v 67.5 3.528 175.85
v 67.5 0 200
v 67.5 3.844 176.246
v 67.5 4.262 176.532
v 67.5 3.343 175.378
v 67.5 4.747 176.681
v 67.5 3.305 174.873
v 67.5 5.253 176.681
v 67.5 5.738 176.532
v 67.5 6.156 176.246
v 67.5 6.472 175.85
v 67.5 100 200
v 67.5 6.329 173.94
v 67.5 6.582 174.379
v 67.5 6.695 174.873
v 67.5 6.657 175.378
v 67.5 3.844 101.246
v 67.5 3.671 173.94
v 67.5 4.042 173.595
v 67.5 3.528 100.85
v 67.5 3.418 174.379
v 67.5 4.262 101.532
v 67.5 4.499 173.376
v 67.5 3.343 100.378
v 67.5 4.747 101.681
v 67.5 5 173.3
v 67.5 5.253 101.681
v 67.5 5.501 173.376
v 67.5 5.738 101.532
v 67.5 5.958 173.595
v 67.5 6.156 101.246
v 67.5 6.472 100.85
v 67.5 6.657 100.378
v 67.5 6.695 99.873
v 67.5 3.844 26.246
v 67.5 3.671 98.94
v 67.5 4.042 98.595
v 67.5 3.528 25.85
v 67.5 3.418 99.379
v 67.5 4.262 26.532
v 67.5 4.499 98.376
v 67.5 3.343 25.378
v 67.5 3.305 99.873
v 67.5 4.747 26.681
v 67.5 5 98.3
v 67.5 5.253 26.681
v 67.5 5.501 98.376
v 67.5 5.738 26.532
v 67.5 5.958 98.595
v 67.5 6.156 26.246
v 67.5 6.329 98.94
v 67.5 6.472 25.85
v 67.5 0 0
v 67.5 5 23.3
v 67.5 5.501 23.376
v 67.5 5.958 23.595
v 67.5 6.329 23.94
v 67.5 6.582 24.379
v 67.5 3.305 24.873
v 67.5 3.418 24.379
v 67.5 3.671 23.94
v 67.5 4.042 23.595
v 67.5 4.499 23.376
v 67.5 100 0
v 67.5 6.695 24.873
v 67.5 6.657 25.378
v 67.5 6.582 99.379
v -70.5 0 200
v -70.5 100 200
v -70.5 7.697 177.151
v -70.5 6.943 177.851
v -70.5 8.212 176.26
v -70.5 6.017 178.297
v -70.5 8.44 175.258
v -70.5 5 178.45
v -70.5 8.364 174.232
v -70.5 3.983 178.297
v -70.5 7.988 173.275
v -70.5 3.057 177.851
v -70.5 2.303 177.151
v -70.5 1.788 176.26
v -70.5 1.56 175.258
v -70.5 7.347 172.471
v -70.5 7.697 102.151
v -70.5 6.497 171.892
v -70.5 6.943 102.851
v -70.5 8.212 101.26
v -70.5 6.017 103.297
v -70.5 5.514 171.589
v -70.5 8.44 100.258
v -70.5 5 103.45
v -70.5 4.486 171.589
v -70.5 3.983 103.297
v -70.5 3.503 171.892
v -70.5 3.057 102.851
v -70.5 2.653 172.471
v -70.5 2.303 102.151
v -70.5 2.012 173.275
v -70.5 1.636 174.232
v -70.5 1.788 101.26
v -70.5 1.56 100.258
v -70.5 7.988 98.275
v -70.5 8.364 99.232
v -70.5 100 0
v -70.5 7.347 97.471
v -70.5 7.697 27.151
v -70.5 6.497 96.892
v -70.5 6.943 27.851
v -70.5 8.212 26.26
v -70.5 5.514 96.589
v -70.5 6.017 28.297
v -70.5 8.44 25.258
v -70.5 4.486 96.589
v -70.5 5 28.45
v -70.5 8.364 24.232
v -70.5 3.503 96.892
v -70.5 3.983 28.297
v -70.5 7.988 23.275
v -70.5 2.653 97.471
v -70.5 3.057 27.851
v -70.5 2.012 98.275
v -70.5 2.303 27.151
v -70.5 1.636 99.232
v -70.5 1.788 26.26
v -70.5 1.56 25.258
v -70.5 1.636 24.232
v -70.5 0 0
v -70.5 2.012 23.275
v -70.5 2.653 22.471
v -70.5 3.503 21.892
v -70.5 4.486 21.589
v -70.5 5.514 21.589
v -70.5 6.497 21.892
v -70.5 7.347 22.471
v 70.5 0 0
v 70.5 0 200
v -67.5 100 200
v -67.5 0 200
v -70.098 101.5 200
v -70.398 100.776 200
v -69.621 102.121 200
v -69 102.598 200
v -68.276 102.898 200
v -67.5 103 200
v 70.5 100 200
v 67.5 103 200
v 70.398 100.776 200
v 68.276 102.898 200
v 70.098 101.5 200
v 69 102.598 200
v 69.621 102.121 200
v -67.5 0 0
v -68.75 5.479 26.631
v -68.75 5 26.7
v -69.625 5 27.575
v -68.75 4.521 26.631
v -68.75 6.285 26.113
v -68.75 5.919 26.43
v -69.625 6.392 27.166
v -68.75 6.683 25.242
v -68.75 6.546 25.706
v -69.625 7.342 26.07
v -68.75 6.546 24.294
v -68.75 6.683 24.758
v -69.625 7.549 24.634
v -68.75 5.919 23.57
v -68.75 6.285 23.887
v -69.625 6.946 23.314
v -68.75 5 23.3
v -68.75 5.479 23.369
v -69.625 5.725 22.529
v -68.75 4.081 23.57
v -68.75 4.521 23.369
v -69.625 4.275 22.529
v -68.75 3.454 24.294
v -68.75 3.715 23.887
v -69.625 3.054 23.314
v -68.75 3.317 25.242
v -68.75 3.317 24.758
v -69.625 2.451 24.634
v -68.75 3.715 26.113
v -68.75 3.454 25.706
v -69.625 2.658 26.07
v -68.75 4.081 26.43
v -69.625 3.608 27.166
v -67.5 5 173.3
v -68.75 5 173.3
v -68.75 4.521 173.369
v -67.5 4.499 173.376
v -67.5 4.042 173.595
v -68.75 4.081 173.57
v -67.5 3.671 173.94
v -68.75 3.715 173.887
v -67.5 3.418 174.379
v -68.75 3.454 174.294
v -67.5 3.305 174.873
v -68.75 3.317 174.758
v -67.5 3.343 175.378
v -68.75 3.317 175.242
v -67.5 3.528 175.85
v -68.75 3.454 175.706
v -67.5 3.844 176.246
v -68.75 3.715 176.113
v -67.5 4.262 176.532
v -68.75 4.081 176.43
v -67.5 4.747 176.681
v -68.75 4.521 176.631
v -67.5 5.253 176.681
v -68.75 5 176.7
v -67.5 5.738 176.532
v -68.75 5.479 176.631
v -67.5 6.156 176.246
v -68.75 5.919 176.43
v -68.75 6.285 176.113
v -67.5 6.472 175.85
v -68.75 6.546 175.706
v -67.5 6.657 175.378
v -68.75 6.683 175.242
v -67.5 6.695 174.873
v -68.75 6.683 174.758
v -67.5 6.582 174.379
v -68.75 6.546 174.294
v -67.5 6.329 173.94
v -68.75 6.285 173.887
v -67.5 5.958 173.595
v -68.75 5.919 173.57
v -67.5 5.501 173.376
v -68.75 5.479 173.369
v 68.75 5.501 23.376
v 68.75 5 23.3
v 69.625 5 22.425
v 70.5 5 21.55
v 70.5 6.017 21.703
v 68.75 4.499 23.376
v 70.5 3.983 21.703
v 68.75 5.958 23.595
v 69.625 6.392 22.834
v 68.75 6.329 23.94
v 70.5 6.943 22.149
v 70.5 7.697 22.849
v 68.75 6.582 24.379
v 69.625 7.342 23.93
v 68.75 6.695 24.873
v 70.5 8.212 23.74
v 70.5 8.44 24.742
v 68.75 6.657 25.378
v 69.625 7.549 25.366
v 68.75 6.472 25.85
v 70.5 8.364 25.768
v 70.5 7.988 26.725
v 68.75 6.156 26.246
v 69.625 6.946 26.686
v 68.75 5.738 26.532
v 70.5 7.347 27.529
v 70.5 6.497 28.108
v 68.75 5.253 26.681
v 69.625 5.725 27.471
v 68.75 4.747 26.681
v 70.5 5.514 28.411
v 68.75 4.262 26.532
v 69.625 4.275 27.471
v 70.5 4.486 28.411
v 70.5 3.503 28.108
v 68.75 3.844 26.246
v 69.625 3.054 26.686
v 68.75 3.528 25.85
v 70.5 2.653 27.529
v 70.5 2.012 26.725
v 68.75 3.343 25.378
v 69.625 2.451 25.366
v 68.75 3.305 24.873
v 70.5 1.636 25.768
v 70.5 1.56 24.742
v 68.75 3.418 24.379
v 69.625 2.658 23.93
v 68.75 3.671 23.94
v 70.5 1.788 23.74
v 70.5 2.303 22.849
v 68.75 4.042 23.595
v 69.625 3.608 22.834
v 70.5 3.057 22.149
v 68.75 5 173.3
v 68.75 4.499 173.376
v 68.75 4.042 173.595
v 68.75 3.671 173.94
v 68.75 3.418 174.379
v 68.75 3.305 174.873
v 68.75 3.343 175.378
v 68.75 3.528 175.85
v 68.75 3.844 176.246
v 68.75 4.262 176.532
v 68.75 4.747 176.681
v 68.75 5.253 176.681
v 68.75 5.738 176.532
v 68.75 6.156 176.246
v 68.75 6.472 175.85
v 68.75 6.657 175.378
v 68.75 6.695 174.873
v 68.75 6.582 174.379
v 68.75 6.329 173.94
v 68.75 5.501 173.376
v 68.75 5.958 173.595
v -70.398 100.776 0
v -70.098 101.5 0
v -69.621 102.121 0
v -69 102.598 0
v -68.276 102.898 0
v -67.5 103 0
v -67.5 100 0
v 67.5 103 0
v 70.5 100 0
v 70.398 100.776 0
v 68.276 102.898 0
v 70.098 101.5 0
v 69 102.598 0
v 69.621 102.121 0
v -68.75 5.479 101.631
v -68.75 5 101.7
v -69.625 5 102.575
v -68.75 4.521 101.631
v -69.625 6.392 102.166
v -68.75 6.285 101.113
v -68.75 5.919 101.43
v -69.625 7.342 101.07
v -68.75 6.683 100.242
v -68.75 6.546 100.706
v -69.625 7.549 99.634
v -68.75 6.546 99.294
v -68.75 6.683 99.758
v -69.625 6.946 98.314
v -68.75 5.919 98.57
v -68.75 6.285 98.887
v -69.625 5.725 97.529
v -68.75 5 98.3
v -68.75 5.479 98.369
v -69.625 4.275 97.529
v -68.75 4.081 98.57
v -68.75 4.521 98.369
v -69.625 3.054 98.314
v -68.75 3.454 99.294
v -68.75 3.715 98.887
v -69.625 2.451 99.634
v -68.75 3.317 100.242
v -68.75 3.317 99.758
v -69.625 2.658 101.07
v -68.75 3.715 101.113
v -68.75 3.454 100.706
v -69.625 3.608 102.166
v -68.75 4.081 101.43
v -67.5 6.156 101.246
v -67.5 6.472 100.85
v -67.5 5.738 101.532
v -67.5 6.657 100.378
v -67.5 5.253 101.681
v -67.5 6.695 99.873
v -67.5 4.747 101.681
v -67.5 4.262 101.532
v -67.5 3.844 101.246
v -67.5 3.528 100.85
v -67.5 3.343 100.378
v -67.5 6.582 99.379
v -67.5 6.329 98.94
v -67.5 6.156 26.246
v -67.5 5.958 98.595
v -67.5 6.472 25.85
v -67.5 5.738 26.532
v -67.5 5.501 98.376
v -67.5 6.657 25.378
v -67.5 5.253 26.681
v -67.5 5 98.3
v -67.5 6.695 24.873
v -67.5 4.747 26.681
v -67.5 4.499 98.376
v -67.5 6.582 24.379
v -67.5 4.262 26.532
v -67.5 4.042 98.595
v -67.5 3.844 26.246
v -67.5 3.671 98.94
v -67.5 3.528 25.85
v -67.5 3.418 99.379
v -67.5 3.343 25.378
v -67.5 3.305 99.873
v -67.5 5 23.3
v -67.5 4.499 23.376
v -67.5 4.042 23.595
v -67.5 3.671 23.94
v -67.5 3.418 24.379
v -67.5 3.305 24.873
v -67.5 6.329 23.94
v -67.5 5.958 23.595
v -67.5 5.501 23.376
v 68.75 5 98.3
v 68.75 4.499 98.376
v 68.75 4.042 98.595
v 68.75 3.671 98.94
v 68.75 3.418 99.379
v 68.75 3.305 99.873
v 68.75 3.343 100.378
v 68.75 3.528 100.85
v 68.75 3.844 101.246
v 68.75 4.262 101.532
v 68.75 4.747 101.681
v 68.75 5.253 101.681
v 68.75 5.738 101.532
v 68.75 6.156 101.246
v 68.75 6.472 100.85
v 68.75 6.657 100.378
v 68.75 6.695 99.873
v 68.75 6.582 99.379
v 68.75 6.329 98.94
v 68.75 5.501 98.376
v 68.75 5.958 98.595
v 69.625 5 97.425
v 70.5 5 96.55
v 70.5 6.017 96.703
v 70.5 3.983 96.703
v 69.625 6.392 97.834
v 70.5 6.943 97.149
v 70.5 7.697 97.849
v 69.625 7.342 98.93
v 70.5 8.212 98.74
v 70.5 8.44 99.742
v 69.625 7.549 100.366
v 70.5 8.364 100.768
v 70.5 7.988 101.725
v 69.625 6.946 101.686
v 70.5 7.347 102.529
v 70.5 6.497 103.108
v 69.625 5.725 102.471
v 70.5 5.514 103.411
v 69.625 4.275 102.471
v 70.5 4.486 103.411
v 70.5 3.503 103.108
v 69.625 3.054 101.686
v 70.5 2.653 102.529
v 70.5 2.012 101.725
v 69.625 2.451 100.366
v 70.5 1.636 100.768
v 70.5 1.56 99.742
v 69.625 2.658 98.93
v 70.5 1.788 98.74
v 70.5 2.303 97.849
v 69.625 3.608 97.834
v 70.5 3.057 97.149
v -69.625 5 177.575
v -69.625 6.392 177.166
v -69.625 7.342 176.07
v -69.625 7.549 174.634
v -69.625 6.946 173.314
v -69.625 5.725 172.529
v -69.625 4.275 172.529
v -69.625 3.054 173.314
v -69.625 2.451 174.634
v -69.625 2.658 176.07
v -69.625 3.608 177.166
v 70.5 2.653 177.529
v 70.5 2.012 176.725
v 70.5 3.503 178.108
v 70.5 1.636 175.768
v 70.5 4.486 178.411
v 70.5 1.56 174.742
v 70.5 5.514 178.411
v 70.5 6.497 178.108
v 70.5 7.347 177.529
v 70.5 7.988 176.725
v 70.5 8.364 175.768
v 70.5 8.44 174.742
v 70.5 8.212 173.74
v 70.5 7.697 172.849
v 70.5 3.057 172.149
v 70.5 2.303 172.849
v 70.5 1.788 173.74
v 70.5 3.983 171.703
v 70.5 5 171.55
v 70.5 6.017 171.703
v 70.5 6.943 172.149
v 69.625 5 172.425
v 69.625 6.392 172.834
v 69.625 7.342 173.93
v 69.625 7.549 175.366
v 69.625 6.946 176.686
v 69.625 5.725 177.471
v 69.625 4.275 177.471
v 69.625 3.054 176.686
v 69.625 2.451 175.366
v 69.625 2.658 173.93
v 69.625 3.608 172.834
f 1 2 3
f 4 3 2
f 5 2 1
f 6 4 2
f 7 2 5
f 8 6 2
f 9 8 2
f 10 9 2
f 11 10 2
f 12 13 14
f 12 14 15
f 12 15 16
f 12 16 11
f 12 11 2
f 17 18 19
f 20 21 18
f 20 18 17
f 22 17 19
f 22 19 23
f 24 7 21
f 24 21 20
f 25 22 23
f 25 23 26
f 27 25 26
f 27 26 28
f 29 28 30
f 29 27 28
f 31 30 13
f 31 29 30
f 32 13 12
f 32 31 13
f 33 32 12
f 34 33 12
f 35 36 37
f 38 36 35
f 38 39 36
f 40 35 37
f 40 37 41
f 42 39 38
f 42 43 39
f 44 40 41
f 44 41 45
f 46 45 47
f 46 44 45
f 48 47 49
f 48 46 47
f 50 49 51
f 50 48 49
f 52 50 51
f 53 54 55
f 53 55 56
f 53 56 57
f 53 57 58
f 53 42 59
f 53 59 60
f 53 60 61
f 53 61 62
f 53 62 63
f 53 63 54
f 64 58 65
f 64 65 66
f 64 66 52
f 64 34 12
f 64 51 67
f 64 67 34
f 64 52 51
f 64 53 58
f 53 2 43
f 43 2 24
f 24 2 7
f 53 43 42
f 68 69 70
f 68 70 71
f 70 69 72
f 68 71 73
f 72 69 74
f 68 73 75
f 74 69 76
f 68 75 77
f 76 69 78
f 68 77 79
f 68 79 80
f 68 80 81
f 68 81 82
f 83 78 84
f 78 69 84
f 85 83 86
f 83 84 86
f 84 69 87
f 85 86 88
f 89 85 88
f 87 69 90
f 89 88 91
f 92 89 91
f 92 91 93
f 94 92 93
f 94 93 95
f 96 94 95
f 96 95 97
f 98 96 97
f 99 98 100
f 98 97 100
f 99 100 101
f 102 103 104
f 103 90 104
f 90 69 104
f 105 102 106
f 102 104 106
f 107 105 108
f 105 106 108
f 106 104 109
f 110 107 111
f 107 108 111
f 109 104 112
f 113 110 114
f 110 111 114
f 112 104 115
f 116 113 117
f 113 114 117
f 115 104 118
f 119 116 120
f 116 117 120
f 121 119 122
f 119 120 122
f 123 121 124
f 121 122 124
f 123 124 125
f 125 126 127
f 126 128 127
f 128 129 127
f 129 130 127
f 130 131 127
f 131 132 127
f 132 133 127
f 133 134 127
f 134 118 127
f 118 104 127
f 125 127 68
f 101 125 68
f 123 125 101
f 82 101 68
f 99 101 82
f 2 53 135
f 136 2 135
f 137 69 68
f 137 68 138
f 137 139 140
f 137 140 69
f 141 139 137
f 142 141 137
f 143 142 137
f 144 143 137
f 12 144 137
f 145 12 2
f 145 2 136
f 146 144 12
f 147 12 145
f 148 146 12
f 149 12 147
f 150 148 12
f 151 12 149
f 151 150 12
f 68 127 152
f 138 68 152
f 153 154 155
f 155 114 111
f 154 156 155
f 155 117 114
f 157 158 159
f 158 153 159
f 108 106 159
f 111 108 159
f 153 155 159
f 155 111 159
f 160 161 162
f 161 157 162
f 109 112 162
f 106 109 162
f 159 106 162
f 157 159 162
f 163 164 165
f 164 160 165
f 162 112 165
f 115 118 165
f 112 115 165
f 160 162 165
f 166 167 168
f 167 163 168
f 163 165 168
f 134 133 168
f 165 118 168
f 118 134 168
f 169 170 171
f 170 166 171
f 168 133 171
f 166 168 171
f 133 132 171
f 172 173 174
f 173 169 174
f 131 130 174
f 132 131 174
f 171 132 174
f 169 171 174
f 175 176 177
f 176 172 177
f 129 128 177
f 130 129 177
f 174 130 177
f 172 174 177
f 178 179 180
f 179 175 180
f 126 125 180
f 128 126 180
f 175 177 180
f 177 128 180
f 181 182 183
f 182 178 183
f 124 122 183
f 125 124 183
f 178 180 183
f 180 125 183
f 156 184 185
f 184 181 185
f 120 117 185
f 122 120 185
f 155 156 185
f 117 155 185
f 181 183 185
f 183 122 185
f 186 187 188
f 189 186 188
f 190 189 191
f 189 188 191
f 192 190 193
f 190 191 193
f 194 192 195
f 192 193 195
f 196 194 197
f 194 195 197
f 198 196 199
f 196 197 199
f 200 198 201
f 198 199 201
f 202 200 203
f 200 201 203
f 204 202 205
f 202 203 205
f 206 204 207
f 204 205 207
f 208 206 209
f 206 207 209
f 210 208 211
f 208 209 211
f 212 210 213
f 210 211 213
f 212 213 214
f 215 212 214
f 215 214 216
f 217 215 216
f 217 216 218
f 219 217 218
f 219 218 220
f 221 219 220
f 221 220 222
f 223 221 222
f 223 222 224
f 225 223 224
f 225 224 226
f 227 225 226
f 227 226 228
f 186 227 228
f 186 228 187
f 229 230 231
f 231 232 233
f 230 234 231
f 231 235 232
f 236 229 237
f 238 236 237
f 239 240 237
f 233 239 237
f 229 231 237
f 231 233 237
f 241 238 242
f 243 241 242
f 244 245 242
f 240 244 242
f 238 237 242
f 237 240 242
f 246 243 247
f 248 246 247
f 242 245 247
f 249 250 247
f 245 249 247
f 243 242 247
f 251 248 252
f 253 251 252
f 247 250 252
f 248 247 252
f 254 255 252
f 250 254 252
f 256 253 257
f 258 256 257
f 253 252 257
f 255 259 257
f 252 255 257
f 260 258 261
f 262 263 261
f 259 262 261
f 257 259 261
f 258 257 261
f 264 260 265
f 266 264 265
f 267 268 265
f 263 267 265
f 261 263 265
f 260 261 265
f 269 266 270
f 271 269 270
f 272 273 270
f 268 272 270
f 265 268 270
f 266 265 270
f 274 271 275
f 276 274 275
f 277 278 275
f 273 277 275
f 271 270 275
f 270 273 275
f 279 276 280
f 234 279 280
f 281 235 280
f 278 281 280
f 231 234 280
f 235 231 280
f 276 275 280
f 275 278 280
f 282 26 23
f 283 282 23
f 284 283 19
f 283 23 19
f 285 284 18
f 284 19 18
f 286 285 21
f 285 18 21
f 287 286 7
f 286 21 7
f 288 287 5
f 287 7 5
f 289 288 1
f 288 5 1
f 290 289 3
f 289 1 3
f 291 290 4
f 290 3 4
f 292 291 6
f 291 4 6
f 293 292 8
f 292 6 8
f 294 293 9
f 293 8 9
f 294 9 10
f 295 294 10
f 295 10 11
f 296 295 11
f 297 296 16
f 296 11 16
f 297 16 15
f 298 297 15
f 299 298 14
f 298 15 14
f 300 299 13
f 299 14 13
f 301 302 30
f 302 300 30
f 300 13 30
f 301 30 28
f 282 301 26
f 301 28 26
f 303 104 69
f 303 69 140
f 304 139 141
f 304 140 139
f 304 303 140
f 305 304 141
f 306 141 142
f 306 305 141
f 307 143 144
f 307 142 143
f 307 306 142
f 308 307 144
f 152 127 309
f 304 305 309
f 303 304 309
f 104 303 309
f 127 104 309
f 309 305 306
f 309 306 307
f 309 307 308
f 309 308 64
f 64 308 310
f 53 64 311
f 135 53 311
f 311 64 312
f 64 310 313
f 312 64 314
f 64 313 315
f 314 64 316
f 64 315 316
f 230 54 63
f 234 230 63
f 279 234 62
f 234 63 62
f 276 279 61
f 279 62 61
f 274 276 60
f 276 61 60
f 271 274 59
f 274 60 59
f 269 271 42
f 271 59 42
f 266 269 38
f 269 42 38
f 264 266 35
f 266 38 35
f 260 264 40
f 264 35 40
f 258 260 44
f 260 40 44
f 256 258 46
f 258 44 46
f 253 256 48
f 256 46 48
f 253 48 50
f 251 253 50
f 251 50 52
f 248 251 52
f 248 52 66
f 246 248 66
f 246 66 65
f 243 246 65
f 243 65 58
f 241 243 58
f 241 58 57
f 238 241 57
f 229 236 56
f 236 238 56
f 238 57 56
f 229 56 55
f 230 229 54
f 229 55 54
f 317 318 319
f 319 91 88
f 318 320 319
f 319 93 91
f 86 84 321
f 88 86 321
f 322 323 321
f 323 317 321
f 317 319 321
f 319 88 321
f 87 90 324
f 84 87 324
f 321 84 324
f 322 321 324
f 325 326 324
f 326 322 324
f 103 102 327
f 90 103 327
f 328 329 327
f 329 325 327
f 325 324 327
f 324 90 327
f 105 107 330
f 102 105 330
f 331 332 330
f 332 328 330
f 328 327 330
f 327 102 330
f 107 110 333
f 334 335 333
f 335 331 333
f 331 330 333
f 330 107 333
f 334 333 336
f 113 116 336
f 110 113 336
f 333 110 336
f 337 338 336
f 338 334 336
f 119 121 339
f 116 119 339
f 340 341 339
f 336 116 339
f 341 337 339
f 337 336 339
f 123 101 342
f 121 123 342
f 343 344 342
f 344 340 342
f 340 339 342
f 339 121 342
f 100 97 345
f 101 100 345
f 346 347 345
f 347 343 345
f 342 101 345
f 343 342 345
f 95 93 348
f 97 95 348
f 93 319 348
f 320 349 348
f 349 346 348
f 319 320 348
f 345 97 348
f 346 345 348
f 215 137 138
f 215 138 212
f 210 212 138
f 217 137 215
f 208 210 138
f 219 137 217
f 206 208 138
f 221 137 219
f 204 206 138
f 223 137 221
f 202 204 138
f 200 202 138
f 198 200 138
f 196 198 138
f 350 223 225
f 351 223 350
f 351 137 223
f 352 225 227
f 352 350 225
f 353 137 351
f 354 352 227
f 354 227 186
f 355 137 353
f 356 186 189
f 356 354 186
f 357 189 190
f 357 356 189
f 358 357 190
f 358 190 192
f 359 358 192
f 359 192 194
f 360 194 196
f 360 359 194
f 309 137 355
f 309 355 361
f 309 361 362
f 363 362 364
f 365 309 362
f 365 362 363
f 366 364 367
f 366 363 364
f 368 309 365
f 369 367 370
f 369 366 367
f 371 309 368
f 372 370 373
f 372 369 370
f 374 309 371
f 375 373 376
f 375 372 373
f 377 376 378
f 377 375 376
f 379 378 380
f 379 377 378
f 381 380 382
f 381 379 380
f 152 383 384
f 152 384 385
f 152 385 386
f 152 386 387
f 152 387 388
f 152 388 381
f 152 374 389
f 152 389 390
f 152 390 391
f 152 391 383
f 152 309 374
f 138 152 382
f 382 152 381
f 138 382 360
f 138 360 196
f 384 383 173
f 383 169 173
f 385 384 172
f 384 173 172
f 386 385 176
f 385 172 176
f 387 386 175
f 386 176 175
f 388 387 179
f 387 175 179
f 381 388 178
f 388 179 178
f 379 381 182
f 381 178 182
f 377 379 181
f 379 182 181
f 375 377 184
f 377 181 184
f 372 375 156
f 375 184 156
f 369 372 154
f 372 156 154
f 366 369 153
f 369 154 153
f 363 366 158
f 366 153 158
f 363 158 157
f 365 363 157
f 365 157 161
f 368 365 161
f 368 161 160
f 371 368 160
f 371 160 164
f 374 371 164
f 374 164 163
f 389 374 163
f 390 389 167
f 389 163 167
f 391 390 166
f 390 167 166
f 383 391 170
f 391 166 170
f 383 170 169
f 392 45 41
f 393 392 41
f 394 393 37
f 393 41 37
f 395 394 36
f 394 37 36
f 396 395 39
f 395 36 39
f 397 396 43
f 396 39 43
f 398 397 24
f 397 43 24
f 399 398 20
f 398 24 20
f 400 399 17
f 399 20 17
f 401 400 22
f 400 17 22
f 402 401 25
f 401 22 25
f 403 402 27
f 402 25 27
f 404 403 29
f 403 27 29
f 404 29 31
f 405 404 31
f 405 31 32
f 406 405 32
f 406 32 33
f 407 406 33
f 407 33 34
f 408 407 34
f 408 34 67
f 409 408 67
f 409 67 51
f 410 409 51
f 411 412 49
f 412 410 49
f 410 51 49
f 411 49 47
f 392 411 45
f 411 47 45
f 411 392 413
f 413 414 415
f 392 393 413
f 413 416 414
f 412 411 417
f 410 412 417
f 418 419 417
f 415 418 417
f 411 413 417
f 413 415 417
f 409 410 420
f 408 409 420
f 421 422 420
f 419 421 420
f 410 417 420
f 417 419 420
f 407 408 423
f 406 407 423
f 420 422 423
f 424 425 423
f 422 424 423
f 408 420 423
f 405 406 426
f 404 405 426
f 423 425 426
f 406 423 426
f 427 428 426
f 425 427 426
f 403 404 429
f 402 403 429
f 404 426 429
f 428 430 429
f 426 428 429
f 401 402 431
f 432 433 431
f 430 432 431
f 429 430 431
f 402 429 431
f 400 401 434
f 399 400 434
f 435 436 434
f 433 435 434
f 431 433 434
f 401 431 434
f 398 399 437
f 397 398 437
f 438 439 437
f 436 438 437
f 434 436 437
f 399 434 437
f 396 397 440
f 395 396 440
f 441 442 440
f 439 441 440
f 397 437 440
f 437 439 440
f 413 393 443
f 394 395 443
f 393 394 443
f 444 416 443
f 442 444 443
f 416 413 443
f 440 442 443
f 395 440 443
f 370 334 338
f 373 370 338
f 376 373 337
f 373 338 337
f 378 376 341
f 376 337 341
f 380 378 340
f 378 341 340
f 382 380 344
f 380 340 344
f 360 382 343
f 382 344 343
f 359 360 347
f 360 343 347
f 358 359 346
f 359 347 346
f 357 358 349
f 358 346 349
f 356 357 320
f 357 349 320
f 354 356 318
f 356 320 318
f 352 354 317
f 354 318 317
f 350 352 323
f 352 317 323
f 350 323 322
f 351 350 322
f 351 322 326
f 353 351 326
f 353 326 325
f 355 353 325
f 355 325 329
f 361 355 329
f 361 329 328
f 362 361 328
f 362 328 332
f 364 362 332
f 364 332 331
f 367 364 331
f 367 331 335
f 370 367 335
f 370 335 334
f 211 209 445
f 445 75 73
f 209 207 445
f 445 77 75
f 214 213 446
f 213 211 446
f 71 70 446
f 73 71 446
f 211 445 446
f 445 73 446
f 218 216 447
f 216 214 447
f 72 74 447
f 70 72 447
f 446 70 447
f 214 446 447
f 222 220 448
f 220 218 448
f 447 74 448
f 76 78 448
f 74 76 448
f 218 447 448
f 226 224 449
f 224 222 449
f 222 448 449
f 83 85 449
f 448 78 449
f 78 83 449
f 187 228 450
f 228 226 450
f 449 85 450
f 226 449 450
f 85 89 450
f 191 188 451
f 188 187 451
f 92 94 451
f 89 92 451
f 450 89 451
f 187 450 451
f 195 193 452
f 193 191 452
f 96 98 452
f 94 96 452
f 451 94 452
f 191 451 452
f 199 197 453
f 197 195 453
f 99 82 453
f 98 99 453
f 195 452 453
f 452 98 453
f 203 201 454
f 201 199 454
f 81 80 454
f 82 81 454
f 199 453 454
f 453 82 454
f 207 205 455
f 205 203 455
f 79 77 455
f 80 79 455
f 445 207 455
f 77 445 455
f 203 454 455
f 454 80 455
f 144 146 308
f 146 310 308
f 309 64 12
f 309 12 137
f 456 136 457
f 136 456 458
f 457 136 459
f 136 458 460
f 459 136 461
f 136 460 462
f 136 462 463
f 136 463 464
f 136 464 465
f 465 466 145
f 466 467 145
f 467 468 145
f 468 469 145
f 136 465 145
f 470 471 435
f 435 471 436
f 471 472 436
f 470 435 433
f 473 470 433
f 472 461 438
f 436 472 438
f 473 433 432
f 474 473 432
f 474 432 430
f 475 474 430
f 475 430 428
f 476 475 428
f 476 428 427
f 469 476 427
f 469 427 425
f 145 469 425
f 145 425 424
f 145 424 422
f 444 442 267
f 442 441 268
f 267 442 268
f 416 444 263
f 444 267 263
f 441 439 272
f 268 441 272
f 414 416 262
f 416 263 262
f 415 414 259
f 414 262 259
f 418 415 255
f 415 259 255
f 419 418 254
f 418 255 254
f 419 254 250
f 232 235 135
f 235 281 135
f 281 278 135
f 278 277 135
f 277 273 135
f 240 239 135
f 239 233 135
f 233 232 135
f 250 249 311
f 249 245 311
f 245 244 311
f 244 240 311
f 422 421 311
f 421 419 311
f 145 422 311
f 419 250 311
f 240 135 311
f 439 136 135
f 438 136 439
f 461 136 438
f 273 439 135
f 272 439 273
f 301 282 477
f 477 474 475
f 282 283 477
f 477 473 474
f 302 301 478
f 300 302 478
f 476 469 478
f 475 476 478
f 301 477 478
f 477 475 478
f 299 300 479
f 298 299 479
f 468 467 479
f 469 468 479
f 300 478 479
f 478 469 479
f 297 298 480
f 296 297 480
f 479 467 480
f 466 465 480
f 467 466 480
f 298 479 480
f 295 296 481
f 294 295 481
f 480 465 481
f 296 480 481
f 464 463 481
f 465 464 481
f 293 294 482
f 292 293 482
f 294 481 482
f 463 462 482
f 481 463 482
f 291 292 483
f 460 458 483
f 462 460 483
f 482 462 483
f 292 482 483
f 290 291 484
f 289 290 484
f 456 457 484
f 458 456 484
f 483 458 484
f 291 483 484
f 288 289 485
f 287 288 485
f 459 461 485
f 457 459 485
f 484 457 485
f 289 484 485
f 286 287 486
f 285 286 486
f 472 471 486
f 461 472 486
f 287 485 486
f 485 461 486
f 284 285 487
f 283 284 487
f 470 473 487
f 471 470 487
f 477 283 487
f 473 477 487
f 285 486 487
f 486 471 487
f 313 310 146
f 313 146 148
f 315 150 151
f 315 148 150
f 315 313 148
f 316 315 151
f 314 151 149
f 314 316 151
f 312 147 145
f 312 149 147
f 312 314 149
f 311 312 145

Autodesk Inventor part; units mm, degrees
ref_plane "YZ Plane" through (0, 0, 0) normal (1, 0, 0) x (0, 1, 0)
ref_plane "XZ Plane" through (0, 0, 0) normal (0, 1, 0) x (-1, 0, 0)
ref_plane "XY Plane" through (0, 0, 0) normal (0, 0, 1) x (1, 0, 0)
sketch "Skizze1" plane through (0, 0, 0) normal (0, 0, 1) x (1, 0, 0)
  line L0 (-99.5698, 0) -> (99.5698, 0) projected
  line L1 (0, -20.7243) -> (0, 124.3456) projected
  line L2 (67.5, 0) -> (67.5, 100)
  line L3 (67.5, 100) -> (-67.5, 100)
  line L4 (-67.5, 100) -> (-67.5, 0)
  line L5 (67.5, 0) -> (70.5, 0)
  line L6 (70.5, 0) -> (70.5, 100)
  line L7 (67.5, 103) -> (-67.5, 103)
  line L8 (-70.5, 100) -> (-70.5, 0)
  line L9 (-70.5, 0) -> (-67.5, 0)
  arc A0 (-67.5, 103) -> (-70.5, 100) centre (-67.5, 100) ccw
  arc A1 (70.5, 100) -> (67.5, 103) centre (67.5, 100) ccw
  point P0 (0, 0)
  dimension "d0" = 135
  dimension "d1" = 3
  dimension "d2" = 100
  dimension "d3" = 3
  dimension "d4" = 3
extrude "Extrusion1" add sketch "Skizze1" along normal blind 200 contours L8 A0 L7 L1 L3 L4 L0 | L2 L3 L1 L7 A1 L6 L0
sketch "Skizze2" plane through (70.5, 0, 0) normal (1, 0, 0) x (0, 0, -1)
  line L0 (-200, 100) -> (-200, 0) projected
  line L1 (0, 0) -> (-200, 0) projected
  line L2 (0, 0) -> (0, 100) projected
  line L3 (0, 100) -> (-200, 100) projected
  line L4 (-200, 5) -> (0, 5)
  line L5 (-100, 100) -> (-100, 0)
  point P0 (-175, 5)
  point P1 (-25, 5)
  point P2 (-100, 5)
  dimension "d7" = 5
  dimension "d8" = 25
  dimension "d9" = 25
hole "Bohrung1" at (70.5, 5, 175) at (70.5, 5, 25) at (70.5, 5, 100) direction (-1, 0, 0) diameter 3.4 end through all countersink diameter 6.9 countersink angle 90
sketch "Skizze3" plane through (-70.5, 0, 0) normal (-1, 0, 0) x (0, 0, 1)
  circle A0 centre (100, 5) radius 1.7 projected
  circle A1 centre (25, 5) radius 1.7 projected
  circle A2 centre (175, 5) radius 1.7 projected
  point P0 (25, 5)
  point P1 (100, 5)
  point P2 (175, 5)
hole "Bohrung2" at (-70.5, 5, 25) at (-70.5, 5, 100) at (-70.5, 5, 175) direction (1, 0, 0) diameter 3.4 end through all countersink diameter 6.9 countersink angle 90
properties part number "13_0204_059"
